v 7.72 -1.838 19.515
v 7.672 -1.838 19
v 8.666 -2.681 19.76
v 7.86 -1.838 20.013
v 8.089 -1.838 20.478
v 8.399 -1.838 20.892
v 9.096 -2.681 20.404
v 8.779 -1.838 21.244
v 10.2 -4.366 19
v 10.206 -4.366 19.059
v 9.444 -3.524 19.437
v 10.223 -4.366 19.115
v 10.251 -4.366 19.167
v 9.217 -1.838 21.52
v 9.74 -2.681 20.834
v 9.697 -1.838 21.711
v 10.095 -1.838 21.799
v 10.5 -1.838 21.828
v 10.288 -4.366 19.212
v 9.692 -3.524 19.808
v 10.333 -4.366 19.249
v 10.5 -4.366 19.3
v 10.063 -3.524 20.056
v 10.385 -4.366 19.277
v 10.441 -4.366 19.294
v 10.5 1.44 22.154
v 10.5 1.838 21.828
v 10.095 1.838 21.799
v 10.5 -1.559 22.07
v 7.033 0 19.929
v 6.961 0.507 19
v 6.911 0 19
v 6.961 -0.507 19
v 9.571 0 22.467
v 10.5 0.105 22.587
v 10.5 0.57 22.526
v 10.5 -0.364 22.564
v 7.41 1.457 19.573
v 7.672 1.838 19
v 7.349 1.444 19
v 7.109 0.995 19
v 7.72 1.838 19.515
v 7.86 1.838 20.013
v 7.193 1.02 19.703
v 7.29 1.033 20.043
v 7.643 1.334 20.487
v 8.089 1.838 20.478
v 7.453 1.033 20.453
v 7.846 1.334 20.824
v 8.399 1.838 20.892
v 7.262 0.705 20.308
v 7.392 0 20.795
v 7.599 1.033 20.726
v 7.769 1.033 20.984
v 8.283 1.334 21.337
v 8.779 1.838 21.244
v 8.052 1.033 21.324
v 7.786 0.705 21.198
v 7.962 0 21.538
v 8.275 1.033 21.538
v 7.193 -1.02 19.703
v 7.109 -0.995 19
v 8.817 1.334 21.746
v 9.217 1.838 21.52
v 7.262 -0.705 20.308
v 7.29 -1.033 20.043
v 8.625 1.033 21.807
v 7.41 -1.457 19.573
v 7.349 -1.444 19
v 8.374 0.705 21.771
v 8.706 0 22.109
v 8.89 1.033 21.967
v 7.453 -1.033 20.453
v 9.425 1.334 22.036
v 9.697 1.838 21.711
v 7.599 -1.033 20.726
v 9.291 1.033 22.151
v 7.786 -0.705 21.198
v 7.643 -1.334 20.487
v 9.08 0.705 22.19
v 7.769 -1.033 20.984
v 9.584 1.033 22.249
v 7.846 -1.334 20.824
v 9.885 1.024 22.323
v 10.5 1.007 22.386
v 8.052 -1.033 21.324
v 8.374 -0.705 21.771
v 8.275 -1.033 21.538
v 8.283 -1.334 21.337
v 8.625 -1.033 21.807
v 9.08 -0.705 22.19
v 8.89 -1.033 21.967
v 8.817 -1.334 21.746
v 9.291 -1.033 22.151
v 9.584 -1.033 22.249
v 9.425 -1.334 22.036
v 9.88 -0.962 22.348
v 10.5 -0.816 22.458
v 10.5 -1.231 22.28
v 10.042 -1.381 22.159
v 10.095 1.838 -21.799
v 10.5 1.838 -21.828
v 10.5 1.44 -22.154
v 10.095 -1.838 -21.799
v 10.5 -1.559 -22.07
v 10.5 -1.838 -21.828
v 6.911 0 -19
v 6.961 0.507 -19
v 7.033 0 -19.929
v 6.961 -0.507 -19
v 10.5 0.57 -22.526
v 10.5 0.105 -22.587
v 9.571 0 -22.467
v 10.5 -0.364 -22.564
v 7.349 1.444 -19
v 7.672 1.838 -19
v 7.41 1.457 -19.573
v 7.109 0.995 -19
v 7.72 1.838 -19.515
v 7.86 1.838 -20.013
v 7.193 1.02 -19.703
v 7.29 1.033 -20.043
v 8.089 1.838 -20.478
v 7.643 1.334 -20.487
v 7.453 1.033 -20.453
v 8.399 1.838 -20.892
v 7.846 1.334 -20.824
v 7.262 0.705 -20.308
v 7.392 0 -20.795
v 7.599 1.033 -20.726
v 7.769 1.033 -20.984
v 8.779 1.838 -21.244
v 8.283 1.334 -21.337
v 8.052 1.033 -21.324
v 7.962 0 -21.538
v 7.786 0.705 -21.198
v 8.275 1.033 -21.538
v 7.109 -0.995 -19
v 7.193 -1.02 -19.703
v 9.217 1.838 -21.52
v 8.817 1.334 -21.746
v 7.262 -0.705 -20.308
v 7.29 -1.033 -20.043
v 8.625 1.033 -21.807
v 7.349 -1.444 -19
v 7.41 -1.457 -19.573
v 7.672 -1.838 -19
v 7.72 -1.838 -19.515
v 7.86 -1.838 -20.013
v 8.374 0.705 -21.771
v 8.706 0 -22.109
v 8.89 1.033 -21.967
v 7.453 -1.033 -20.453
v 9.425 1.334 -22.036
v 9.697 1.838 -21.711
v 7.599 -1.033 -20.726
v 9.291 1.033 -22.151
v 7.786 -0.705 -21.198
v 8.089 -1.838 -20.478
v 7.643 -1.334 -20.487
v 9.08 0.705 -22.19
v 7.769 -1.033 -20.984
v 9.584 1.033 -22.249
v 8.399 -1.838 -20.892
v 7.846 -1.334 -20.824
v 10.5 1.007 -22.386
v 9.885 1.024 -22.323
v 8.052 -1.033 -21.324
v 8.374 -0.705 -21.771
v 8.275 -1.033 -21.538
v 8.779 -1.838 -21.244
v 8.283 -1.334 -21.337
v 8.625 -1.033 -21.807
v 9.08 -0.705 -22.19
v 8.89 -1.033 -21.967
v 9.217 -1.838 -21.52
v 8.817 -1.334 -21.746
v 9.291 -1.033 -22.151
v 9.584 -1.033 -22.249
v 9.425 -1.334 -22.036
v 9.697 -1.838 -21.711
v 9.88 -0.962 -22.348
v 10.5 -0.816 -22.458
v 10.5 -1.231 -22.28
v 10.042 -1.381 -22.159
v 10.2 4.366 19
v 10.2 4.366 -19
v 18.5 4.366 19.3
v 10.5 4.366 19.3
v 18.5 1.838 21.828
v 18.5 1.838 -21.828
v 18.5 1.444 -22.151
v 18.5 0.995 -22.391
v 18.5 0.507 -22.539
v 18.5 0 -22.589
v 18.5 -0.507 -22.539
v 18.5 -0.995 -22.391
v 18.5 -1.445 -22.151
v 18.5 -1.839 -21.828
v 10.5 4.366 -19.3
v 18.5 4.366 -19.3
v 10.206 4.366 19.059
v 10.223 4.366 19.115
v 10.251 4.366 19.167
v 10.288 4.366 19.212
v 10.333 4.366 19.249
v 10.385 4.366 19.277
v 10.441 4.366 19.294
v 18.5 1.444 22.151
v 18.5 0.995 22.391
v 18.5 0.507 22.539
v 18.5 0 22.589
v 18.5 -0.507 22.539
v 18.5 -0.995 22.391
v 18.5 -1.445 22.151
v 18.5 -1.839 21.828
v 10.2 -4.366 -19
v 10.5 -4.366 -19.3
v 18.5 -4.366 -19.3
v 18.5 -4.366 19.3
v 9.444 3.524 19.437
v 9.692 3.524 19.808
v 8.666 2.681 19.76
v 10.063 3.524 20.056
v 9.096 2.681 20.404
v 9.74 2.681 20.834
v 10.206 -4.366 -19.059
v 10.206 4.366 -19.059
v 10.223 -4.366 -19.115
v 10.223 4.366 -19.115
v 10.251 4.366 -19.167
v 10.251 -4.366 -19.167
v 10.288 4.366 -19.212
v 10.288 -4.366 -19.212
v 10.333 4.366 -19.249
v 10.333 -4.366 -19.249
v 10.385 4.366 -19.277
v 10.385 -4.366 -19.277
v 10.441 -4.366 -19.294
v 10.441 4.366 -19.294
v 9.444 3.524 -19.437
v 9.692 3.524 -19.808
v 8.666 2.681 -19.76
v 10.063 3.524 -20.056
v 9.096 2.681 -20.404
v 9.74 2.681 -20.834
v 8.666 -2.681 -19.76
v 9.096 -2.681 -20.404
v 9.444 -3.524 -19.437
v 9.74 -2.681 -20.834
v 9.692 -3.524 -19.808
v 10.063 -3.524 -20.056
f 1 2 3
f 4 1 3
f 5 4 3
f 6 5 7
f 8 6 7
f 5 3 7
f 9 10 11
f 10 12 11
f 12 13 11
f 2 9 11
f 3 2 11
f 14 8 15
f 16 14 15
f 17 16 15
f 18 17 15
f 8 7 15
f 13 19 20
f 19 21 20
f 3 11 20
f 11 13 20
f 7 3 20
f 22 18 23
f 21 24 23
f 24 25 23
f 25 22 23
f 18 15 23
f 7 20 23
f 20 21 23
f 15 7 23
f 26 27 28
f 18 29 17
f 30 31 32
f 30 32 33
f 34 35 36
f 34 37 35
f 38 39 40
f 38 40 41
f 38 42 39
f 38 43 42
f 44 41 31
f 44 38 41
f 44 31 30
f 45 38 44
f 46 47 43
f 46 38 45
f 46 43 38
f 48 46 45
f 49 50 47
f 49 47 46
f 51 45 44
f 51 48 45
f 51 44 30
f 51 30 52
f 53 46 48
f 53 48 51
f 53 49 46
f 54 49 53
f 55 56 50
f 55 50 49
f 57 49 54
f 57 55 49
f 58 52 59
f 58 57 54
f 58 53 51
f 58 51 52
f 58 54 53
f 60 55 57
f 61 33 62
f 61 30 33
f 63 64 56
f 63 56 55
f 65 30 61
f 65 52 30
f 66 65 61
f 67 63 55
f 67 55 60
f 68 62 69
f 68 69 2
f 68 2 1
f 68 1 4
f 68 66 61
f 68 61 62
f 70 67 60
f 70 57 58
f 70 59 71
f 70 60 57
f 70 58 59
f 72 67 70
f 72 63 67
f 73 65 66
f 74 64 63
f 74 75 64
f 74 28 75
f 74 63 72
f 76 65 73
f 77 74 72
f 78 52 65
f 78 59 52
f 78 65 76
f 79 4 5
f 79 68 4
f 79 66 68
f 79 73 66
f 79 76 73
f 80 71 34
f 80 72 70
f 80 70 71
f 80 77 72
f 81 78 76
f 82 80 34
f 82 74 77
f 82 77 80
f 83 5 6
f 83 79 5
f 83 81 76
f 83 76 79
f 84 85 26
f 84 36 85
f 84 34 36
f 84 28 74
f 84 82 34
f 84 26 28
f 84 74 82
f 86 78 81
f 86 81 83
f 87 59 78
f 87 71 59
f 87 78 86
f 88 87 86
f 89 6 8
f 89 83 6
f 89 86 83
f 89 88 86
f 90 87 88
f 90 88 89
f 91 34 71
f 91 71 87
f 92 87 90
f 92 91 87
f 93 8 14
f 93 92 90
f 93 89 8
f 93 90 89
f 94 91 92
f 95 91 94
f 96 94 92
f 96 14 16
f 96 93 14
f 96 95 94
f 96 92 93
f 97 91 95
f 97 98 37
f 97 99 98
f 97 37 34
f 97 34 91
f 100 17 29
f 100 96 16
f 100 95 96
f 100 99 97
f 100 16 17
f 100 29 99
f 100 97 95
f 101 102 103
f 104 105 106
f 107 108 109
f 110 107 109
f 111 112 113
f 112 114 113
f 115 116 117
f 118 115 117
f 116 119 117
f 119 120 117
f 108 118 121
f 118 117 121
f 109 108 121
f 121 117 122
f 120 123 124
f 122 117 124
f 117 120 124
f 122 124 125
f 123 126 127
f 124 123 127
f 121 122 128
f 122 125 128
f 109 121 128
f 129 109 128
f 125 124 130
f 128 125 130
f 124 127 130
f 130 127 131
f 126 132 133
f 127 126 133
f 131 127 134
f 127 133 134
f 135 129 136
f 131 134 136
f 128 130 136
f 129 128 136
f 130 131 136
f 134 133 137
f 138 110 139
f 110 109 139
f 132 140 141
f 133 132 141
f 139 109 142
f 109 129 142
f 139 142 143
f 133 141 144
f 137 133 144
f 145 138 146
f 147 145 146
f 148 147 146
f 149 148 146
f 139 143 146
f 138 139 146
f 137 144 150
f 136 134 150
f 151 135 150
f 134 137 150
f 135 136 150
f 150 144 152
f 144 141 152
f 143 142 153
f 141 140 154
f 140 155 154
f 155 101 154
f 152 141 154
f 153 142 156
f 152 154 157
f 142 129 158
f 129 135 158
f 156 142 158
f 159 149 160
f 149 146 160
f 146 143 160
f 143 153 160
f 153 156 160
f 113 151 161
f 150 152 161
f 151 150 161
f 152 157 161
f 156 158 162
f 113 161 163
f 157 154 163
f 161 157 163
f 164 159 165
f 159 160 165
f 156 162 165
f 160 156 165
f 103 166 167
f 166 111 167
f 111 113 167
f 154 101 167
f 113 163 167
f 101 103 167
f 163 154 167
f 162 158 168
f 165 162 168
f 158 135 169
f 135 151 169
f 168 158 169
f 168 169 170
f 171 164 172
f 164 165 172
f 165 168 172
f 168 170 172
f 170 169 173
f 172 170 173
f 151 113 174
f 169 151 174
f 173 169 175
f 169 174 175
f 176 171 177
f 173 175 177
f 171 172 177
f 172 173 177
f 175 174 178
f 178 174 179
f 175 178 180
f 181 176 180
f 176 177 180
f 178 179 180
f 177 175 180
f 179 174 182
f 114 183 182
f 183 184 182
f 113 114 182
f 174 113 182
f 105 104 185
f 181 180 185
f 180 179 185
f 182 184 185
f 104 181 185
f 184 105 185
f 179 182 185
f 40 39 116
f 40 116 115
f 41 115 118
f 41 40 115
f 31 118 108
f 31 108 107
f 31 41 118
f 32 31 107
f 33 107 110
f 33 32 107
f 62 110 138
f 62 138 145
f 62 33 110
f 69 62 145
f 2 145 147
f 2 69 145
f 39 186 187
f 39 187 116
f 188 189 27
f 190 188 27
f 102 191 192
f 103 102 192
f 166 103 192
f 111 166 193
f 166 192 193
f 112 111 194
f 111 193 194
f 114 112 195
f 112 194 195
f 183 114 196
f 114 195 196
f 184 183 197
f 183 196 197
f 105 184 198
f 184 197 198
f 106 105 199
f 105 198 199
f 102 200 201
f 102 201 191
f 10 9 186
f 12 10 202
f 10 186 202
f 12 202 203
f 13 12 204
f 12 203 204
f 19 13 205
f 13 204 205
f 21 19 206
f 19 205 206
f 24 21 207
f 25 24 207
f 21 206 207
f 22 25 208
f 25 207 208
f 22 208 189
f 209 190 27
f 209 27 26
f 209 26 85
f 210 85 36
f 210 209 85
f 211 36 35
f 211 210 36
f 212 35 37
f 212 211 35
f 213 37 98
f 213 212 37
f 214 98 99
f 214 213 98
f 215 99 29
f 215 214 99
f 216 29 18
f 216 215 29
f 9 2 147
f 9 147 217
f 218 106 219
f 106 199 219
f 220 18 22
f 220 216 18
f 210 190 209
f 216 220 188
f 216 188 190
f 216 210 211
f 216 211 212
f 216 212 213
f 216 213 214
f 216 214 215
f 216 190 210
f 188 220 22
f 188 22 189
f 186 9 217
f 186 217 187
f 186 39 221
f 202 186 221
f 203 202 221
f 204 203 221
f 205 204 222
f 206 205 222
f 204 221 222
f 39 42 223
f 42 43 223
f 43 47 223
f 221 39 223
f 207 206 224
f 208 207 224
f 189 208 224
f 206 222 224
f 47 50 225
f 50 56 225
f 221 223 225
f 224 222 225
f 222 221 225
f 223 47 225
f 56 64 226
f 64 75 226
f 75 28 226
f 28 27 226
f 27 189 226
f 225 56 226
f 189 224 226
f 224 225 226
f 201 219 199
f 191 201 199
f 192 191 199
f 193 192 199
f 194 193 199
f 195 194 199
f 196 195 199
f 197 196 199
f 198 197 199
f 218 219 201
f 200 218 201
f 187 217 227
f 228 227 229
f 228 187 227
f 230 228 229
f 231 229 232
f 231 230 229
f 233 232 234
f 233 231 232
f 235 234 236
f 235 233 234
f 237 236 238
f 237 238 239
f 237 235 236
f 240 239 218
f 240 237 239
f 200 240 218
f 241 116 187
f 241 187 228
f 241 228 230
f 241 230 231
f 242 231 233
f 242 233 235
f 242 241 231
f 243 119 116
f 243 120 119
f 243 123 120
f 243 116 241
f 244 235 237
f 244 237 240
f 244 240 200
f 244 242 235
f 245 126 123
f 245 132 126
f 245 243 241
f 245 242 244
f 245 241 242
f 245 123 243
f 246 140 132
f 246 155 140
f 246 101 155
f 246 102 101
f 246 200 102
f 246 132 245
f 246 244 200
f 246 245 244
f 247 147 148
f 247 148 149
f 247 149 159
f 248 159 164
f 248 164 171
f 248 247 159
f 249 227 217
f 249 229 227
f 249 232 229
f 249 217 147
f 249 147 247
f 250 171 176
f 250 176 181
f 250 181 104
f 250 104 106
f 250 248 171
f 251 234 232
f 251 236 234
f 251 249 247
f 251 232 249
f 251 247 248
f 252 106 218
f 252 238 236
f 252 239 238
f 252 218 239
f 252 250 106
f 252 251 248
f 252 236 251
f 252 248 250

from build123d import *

# Parameters (mm, degrees)
FILLET003_R = 2.6


with BuildPart() as railfillet:
    # Sweep: sweep along a path in Sketch002
    with BuildLine(Plane.XZ) as sweep_path:
        Line((6.5, 0), (6.5, 19))
        ThreePointArc((6.5, 19), (7.671582, 21.828411), (10.5, 22.999974))
        Line((10.5, 22.999974), (18.5, 22.999974))
    # Sketch011 → Sweep (sweep)
    with BuildSketch(Plane.XY):
        Polygon((10.2, 4.366273), (5.833727, 0), (10.2, -4.366273), align=None)
    sweep(path=sweep_path.line)

    # Fillet003
    fillet003_edges = [railfillet.edges().sort_by_distance(p)[0] for p in [
        (14.499996, -1.3e-05, 23.66626),
    ]]
    fillet(fillet003_edges, radius=FILLET003_R)


with BuildPart() as guide:
    # Part__Mirroring: instance of RailFillet
    add(railfillet.part.mirror(Plane(origin=(0, 0, 0), x_dir=(0, 1, 0), z_dir=(0, 0, 1))))

    # Fusion001: union RailFillet
    add(railfillet.part)


solid = guide.part
